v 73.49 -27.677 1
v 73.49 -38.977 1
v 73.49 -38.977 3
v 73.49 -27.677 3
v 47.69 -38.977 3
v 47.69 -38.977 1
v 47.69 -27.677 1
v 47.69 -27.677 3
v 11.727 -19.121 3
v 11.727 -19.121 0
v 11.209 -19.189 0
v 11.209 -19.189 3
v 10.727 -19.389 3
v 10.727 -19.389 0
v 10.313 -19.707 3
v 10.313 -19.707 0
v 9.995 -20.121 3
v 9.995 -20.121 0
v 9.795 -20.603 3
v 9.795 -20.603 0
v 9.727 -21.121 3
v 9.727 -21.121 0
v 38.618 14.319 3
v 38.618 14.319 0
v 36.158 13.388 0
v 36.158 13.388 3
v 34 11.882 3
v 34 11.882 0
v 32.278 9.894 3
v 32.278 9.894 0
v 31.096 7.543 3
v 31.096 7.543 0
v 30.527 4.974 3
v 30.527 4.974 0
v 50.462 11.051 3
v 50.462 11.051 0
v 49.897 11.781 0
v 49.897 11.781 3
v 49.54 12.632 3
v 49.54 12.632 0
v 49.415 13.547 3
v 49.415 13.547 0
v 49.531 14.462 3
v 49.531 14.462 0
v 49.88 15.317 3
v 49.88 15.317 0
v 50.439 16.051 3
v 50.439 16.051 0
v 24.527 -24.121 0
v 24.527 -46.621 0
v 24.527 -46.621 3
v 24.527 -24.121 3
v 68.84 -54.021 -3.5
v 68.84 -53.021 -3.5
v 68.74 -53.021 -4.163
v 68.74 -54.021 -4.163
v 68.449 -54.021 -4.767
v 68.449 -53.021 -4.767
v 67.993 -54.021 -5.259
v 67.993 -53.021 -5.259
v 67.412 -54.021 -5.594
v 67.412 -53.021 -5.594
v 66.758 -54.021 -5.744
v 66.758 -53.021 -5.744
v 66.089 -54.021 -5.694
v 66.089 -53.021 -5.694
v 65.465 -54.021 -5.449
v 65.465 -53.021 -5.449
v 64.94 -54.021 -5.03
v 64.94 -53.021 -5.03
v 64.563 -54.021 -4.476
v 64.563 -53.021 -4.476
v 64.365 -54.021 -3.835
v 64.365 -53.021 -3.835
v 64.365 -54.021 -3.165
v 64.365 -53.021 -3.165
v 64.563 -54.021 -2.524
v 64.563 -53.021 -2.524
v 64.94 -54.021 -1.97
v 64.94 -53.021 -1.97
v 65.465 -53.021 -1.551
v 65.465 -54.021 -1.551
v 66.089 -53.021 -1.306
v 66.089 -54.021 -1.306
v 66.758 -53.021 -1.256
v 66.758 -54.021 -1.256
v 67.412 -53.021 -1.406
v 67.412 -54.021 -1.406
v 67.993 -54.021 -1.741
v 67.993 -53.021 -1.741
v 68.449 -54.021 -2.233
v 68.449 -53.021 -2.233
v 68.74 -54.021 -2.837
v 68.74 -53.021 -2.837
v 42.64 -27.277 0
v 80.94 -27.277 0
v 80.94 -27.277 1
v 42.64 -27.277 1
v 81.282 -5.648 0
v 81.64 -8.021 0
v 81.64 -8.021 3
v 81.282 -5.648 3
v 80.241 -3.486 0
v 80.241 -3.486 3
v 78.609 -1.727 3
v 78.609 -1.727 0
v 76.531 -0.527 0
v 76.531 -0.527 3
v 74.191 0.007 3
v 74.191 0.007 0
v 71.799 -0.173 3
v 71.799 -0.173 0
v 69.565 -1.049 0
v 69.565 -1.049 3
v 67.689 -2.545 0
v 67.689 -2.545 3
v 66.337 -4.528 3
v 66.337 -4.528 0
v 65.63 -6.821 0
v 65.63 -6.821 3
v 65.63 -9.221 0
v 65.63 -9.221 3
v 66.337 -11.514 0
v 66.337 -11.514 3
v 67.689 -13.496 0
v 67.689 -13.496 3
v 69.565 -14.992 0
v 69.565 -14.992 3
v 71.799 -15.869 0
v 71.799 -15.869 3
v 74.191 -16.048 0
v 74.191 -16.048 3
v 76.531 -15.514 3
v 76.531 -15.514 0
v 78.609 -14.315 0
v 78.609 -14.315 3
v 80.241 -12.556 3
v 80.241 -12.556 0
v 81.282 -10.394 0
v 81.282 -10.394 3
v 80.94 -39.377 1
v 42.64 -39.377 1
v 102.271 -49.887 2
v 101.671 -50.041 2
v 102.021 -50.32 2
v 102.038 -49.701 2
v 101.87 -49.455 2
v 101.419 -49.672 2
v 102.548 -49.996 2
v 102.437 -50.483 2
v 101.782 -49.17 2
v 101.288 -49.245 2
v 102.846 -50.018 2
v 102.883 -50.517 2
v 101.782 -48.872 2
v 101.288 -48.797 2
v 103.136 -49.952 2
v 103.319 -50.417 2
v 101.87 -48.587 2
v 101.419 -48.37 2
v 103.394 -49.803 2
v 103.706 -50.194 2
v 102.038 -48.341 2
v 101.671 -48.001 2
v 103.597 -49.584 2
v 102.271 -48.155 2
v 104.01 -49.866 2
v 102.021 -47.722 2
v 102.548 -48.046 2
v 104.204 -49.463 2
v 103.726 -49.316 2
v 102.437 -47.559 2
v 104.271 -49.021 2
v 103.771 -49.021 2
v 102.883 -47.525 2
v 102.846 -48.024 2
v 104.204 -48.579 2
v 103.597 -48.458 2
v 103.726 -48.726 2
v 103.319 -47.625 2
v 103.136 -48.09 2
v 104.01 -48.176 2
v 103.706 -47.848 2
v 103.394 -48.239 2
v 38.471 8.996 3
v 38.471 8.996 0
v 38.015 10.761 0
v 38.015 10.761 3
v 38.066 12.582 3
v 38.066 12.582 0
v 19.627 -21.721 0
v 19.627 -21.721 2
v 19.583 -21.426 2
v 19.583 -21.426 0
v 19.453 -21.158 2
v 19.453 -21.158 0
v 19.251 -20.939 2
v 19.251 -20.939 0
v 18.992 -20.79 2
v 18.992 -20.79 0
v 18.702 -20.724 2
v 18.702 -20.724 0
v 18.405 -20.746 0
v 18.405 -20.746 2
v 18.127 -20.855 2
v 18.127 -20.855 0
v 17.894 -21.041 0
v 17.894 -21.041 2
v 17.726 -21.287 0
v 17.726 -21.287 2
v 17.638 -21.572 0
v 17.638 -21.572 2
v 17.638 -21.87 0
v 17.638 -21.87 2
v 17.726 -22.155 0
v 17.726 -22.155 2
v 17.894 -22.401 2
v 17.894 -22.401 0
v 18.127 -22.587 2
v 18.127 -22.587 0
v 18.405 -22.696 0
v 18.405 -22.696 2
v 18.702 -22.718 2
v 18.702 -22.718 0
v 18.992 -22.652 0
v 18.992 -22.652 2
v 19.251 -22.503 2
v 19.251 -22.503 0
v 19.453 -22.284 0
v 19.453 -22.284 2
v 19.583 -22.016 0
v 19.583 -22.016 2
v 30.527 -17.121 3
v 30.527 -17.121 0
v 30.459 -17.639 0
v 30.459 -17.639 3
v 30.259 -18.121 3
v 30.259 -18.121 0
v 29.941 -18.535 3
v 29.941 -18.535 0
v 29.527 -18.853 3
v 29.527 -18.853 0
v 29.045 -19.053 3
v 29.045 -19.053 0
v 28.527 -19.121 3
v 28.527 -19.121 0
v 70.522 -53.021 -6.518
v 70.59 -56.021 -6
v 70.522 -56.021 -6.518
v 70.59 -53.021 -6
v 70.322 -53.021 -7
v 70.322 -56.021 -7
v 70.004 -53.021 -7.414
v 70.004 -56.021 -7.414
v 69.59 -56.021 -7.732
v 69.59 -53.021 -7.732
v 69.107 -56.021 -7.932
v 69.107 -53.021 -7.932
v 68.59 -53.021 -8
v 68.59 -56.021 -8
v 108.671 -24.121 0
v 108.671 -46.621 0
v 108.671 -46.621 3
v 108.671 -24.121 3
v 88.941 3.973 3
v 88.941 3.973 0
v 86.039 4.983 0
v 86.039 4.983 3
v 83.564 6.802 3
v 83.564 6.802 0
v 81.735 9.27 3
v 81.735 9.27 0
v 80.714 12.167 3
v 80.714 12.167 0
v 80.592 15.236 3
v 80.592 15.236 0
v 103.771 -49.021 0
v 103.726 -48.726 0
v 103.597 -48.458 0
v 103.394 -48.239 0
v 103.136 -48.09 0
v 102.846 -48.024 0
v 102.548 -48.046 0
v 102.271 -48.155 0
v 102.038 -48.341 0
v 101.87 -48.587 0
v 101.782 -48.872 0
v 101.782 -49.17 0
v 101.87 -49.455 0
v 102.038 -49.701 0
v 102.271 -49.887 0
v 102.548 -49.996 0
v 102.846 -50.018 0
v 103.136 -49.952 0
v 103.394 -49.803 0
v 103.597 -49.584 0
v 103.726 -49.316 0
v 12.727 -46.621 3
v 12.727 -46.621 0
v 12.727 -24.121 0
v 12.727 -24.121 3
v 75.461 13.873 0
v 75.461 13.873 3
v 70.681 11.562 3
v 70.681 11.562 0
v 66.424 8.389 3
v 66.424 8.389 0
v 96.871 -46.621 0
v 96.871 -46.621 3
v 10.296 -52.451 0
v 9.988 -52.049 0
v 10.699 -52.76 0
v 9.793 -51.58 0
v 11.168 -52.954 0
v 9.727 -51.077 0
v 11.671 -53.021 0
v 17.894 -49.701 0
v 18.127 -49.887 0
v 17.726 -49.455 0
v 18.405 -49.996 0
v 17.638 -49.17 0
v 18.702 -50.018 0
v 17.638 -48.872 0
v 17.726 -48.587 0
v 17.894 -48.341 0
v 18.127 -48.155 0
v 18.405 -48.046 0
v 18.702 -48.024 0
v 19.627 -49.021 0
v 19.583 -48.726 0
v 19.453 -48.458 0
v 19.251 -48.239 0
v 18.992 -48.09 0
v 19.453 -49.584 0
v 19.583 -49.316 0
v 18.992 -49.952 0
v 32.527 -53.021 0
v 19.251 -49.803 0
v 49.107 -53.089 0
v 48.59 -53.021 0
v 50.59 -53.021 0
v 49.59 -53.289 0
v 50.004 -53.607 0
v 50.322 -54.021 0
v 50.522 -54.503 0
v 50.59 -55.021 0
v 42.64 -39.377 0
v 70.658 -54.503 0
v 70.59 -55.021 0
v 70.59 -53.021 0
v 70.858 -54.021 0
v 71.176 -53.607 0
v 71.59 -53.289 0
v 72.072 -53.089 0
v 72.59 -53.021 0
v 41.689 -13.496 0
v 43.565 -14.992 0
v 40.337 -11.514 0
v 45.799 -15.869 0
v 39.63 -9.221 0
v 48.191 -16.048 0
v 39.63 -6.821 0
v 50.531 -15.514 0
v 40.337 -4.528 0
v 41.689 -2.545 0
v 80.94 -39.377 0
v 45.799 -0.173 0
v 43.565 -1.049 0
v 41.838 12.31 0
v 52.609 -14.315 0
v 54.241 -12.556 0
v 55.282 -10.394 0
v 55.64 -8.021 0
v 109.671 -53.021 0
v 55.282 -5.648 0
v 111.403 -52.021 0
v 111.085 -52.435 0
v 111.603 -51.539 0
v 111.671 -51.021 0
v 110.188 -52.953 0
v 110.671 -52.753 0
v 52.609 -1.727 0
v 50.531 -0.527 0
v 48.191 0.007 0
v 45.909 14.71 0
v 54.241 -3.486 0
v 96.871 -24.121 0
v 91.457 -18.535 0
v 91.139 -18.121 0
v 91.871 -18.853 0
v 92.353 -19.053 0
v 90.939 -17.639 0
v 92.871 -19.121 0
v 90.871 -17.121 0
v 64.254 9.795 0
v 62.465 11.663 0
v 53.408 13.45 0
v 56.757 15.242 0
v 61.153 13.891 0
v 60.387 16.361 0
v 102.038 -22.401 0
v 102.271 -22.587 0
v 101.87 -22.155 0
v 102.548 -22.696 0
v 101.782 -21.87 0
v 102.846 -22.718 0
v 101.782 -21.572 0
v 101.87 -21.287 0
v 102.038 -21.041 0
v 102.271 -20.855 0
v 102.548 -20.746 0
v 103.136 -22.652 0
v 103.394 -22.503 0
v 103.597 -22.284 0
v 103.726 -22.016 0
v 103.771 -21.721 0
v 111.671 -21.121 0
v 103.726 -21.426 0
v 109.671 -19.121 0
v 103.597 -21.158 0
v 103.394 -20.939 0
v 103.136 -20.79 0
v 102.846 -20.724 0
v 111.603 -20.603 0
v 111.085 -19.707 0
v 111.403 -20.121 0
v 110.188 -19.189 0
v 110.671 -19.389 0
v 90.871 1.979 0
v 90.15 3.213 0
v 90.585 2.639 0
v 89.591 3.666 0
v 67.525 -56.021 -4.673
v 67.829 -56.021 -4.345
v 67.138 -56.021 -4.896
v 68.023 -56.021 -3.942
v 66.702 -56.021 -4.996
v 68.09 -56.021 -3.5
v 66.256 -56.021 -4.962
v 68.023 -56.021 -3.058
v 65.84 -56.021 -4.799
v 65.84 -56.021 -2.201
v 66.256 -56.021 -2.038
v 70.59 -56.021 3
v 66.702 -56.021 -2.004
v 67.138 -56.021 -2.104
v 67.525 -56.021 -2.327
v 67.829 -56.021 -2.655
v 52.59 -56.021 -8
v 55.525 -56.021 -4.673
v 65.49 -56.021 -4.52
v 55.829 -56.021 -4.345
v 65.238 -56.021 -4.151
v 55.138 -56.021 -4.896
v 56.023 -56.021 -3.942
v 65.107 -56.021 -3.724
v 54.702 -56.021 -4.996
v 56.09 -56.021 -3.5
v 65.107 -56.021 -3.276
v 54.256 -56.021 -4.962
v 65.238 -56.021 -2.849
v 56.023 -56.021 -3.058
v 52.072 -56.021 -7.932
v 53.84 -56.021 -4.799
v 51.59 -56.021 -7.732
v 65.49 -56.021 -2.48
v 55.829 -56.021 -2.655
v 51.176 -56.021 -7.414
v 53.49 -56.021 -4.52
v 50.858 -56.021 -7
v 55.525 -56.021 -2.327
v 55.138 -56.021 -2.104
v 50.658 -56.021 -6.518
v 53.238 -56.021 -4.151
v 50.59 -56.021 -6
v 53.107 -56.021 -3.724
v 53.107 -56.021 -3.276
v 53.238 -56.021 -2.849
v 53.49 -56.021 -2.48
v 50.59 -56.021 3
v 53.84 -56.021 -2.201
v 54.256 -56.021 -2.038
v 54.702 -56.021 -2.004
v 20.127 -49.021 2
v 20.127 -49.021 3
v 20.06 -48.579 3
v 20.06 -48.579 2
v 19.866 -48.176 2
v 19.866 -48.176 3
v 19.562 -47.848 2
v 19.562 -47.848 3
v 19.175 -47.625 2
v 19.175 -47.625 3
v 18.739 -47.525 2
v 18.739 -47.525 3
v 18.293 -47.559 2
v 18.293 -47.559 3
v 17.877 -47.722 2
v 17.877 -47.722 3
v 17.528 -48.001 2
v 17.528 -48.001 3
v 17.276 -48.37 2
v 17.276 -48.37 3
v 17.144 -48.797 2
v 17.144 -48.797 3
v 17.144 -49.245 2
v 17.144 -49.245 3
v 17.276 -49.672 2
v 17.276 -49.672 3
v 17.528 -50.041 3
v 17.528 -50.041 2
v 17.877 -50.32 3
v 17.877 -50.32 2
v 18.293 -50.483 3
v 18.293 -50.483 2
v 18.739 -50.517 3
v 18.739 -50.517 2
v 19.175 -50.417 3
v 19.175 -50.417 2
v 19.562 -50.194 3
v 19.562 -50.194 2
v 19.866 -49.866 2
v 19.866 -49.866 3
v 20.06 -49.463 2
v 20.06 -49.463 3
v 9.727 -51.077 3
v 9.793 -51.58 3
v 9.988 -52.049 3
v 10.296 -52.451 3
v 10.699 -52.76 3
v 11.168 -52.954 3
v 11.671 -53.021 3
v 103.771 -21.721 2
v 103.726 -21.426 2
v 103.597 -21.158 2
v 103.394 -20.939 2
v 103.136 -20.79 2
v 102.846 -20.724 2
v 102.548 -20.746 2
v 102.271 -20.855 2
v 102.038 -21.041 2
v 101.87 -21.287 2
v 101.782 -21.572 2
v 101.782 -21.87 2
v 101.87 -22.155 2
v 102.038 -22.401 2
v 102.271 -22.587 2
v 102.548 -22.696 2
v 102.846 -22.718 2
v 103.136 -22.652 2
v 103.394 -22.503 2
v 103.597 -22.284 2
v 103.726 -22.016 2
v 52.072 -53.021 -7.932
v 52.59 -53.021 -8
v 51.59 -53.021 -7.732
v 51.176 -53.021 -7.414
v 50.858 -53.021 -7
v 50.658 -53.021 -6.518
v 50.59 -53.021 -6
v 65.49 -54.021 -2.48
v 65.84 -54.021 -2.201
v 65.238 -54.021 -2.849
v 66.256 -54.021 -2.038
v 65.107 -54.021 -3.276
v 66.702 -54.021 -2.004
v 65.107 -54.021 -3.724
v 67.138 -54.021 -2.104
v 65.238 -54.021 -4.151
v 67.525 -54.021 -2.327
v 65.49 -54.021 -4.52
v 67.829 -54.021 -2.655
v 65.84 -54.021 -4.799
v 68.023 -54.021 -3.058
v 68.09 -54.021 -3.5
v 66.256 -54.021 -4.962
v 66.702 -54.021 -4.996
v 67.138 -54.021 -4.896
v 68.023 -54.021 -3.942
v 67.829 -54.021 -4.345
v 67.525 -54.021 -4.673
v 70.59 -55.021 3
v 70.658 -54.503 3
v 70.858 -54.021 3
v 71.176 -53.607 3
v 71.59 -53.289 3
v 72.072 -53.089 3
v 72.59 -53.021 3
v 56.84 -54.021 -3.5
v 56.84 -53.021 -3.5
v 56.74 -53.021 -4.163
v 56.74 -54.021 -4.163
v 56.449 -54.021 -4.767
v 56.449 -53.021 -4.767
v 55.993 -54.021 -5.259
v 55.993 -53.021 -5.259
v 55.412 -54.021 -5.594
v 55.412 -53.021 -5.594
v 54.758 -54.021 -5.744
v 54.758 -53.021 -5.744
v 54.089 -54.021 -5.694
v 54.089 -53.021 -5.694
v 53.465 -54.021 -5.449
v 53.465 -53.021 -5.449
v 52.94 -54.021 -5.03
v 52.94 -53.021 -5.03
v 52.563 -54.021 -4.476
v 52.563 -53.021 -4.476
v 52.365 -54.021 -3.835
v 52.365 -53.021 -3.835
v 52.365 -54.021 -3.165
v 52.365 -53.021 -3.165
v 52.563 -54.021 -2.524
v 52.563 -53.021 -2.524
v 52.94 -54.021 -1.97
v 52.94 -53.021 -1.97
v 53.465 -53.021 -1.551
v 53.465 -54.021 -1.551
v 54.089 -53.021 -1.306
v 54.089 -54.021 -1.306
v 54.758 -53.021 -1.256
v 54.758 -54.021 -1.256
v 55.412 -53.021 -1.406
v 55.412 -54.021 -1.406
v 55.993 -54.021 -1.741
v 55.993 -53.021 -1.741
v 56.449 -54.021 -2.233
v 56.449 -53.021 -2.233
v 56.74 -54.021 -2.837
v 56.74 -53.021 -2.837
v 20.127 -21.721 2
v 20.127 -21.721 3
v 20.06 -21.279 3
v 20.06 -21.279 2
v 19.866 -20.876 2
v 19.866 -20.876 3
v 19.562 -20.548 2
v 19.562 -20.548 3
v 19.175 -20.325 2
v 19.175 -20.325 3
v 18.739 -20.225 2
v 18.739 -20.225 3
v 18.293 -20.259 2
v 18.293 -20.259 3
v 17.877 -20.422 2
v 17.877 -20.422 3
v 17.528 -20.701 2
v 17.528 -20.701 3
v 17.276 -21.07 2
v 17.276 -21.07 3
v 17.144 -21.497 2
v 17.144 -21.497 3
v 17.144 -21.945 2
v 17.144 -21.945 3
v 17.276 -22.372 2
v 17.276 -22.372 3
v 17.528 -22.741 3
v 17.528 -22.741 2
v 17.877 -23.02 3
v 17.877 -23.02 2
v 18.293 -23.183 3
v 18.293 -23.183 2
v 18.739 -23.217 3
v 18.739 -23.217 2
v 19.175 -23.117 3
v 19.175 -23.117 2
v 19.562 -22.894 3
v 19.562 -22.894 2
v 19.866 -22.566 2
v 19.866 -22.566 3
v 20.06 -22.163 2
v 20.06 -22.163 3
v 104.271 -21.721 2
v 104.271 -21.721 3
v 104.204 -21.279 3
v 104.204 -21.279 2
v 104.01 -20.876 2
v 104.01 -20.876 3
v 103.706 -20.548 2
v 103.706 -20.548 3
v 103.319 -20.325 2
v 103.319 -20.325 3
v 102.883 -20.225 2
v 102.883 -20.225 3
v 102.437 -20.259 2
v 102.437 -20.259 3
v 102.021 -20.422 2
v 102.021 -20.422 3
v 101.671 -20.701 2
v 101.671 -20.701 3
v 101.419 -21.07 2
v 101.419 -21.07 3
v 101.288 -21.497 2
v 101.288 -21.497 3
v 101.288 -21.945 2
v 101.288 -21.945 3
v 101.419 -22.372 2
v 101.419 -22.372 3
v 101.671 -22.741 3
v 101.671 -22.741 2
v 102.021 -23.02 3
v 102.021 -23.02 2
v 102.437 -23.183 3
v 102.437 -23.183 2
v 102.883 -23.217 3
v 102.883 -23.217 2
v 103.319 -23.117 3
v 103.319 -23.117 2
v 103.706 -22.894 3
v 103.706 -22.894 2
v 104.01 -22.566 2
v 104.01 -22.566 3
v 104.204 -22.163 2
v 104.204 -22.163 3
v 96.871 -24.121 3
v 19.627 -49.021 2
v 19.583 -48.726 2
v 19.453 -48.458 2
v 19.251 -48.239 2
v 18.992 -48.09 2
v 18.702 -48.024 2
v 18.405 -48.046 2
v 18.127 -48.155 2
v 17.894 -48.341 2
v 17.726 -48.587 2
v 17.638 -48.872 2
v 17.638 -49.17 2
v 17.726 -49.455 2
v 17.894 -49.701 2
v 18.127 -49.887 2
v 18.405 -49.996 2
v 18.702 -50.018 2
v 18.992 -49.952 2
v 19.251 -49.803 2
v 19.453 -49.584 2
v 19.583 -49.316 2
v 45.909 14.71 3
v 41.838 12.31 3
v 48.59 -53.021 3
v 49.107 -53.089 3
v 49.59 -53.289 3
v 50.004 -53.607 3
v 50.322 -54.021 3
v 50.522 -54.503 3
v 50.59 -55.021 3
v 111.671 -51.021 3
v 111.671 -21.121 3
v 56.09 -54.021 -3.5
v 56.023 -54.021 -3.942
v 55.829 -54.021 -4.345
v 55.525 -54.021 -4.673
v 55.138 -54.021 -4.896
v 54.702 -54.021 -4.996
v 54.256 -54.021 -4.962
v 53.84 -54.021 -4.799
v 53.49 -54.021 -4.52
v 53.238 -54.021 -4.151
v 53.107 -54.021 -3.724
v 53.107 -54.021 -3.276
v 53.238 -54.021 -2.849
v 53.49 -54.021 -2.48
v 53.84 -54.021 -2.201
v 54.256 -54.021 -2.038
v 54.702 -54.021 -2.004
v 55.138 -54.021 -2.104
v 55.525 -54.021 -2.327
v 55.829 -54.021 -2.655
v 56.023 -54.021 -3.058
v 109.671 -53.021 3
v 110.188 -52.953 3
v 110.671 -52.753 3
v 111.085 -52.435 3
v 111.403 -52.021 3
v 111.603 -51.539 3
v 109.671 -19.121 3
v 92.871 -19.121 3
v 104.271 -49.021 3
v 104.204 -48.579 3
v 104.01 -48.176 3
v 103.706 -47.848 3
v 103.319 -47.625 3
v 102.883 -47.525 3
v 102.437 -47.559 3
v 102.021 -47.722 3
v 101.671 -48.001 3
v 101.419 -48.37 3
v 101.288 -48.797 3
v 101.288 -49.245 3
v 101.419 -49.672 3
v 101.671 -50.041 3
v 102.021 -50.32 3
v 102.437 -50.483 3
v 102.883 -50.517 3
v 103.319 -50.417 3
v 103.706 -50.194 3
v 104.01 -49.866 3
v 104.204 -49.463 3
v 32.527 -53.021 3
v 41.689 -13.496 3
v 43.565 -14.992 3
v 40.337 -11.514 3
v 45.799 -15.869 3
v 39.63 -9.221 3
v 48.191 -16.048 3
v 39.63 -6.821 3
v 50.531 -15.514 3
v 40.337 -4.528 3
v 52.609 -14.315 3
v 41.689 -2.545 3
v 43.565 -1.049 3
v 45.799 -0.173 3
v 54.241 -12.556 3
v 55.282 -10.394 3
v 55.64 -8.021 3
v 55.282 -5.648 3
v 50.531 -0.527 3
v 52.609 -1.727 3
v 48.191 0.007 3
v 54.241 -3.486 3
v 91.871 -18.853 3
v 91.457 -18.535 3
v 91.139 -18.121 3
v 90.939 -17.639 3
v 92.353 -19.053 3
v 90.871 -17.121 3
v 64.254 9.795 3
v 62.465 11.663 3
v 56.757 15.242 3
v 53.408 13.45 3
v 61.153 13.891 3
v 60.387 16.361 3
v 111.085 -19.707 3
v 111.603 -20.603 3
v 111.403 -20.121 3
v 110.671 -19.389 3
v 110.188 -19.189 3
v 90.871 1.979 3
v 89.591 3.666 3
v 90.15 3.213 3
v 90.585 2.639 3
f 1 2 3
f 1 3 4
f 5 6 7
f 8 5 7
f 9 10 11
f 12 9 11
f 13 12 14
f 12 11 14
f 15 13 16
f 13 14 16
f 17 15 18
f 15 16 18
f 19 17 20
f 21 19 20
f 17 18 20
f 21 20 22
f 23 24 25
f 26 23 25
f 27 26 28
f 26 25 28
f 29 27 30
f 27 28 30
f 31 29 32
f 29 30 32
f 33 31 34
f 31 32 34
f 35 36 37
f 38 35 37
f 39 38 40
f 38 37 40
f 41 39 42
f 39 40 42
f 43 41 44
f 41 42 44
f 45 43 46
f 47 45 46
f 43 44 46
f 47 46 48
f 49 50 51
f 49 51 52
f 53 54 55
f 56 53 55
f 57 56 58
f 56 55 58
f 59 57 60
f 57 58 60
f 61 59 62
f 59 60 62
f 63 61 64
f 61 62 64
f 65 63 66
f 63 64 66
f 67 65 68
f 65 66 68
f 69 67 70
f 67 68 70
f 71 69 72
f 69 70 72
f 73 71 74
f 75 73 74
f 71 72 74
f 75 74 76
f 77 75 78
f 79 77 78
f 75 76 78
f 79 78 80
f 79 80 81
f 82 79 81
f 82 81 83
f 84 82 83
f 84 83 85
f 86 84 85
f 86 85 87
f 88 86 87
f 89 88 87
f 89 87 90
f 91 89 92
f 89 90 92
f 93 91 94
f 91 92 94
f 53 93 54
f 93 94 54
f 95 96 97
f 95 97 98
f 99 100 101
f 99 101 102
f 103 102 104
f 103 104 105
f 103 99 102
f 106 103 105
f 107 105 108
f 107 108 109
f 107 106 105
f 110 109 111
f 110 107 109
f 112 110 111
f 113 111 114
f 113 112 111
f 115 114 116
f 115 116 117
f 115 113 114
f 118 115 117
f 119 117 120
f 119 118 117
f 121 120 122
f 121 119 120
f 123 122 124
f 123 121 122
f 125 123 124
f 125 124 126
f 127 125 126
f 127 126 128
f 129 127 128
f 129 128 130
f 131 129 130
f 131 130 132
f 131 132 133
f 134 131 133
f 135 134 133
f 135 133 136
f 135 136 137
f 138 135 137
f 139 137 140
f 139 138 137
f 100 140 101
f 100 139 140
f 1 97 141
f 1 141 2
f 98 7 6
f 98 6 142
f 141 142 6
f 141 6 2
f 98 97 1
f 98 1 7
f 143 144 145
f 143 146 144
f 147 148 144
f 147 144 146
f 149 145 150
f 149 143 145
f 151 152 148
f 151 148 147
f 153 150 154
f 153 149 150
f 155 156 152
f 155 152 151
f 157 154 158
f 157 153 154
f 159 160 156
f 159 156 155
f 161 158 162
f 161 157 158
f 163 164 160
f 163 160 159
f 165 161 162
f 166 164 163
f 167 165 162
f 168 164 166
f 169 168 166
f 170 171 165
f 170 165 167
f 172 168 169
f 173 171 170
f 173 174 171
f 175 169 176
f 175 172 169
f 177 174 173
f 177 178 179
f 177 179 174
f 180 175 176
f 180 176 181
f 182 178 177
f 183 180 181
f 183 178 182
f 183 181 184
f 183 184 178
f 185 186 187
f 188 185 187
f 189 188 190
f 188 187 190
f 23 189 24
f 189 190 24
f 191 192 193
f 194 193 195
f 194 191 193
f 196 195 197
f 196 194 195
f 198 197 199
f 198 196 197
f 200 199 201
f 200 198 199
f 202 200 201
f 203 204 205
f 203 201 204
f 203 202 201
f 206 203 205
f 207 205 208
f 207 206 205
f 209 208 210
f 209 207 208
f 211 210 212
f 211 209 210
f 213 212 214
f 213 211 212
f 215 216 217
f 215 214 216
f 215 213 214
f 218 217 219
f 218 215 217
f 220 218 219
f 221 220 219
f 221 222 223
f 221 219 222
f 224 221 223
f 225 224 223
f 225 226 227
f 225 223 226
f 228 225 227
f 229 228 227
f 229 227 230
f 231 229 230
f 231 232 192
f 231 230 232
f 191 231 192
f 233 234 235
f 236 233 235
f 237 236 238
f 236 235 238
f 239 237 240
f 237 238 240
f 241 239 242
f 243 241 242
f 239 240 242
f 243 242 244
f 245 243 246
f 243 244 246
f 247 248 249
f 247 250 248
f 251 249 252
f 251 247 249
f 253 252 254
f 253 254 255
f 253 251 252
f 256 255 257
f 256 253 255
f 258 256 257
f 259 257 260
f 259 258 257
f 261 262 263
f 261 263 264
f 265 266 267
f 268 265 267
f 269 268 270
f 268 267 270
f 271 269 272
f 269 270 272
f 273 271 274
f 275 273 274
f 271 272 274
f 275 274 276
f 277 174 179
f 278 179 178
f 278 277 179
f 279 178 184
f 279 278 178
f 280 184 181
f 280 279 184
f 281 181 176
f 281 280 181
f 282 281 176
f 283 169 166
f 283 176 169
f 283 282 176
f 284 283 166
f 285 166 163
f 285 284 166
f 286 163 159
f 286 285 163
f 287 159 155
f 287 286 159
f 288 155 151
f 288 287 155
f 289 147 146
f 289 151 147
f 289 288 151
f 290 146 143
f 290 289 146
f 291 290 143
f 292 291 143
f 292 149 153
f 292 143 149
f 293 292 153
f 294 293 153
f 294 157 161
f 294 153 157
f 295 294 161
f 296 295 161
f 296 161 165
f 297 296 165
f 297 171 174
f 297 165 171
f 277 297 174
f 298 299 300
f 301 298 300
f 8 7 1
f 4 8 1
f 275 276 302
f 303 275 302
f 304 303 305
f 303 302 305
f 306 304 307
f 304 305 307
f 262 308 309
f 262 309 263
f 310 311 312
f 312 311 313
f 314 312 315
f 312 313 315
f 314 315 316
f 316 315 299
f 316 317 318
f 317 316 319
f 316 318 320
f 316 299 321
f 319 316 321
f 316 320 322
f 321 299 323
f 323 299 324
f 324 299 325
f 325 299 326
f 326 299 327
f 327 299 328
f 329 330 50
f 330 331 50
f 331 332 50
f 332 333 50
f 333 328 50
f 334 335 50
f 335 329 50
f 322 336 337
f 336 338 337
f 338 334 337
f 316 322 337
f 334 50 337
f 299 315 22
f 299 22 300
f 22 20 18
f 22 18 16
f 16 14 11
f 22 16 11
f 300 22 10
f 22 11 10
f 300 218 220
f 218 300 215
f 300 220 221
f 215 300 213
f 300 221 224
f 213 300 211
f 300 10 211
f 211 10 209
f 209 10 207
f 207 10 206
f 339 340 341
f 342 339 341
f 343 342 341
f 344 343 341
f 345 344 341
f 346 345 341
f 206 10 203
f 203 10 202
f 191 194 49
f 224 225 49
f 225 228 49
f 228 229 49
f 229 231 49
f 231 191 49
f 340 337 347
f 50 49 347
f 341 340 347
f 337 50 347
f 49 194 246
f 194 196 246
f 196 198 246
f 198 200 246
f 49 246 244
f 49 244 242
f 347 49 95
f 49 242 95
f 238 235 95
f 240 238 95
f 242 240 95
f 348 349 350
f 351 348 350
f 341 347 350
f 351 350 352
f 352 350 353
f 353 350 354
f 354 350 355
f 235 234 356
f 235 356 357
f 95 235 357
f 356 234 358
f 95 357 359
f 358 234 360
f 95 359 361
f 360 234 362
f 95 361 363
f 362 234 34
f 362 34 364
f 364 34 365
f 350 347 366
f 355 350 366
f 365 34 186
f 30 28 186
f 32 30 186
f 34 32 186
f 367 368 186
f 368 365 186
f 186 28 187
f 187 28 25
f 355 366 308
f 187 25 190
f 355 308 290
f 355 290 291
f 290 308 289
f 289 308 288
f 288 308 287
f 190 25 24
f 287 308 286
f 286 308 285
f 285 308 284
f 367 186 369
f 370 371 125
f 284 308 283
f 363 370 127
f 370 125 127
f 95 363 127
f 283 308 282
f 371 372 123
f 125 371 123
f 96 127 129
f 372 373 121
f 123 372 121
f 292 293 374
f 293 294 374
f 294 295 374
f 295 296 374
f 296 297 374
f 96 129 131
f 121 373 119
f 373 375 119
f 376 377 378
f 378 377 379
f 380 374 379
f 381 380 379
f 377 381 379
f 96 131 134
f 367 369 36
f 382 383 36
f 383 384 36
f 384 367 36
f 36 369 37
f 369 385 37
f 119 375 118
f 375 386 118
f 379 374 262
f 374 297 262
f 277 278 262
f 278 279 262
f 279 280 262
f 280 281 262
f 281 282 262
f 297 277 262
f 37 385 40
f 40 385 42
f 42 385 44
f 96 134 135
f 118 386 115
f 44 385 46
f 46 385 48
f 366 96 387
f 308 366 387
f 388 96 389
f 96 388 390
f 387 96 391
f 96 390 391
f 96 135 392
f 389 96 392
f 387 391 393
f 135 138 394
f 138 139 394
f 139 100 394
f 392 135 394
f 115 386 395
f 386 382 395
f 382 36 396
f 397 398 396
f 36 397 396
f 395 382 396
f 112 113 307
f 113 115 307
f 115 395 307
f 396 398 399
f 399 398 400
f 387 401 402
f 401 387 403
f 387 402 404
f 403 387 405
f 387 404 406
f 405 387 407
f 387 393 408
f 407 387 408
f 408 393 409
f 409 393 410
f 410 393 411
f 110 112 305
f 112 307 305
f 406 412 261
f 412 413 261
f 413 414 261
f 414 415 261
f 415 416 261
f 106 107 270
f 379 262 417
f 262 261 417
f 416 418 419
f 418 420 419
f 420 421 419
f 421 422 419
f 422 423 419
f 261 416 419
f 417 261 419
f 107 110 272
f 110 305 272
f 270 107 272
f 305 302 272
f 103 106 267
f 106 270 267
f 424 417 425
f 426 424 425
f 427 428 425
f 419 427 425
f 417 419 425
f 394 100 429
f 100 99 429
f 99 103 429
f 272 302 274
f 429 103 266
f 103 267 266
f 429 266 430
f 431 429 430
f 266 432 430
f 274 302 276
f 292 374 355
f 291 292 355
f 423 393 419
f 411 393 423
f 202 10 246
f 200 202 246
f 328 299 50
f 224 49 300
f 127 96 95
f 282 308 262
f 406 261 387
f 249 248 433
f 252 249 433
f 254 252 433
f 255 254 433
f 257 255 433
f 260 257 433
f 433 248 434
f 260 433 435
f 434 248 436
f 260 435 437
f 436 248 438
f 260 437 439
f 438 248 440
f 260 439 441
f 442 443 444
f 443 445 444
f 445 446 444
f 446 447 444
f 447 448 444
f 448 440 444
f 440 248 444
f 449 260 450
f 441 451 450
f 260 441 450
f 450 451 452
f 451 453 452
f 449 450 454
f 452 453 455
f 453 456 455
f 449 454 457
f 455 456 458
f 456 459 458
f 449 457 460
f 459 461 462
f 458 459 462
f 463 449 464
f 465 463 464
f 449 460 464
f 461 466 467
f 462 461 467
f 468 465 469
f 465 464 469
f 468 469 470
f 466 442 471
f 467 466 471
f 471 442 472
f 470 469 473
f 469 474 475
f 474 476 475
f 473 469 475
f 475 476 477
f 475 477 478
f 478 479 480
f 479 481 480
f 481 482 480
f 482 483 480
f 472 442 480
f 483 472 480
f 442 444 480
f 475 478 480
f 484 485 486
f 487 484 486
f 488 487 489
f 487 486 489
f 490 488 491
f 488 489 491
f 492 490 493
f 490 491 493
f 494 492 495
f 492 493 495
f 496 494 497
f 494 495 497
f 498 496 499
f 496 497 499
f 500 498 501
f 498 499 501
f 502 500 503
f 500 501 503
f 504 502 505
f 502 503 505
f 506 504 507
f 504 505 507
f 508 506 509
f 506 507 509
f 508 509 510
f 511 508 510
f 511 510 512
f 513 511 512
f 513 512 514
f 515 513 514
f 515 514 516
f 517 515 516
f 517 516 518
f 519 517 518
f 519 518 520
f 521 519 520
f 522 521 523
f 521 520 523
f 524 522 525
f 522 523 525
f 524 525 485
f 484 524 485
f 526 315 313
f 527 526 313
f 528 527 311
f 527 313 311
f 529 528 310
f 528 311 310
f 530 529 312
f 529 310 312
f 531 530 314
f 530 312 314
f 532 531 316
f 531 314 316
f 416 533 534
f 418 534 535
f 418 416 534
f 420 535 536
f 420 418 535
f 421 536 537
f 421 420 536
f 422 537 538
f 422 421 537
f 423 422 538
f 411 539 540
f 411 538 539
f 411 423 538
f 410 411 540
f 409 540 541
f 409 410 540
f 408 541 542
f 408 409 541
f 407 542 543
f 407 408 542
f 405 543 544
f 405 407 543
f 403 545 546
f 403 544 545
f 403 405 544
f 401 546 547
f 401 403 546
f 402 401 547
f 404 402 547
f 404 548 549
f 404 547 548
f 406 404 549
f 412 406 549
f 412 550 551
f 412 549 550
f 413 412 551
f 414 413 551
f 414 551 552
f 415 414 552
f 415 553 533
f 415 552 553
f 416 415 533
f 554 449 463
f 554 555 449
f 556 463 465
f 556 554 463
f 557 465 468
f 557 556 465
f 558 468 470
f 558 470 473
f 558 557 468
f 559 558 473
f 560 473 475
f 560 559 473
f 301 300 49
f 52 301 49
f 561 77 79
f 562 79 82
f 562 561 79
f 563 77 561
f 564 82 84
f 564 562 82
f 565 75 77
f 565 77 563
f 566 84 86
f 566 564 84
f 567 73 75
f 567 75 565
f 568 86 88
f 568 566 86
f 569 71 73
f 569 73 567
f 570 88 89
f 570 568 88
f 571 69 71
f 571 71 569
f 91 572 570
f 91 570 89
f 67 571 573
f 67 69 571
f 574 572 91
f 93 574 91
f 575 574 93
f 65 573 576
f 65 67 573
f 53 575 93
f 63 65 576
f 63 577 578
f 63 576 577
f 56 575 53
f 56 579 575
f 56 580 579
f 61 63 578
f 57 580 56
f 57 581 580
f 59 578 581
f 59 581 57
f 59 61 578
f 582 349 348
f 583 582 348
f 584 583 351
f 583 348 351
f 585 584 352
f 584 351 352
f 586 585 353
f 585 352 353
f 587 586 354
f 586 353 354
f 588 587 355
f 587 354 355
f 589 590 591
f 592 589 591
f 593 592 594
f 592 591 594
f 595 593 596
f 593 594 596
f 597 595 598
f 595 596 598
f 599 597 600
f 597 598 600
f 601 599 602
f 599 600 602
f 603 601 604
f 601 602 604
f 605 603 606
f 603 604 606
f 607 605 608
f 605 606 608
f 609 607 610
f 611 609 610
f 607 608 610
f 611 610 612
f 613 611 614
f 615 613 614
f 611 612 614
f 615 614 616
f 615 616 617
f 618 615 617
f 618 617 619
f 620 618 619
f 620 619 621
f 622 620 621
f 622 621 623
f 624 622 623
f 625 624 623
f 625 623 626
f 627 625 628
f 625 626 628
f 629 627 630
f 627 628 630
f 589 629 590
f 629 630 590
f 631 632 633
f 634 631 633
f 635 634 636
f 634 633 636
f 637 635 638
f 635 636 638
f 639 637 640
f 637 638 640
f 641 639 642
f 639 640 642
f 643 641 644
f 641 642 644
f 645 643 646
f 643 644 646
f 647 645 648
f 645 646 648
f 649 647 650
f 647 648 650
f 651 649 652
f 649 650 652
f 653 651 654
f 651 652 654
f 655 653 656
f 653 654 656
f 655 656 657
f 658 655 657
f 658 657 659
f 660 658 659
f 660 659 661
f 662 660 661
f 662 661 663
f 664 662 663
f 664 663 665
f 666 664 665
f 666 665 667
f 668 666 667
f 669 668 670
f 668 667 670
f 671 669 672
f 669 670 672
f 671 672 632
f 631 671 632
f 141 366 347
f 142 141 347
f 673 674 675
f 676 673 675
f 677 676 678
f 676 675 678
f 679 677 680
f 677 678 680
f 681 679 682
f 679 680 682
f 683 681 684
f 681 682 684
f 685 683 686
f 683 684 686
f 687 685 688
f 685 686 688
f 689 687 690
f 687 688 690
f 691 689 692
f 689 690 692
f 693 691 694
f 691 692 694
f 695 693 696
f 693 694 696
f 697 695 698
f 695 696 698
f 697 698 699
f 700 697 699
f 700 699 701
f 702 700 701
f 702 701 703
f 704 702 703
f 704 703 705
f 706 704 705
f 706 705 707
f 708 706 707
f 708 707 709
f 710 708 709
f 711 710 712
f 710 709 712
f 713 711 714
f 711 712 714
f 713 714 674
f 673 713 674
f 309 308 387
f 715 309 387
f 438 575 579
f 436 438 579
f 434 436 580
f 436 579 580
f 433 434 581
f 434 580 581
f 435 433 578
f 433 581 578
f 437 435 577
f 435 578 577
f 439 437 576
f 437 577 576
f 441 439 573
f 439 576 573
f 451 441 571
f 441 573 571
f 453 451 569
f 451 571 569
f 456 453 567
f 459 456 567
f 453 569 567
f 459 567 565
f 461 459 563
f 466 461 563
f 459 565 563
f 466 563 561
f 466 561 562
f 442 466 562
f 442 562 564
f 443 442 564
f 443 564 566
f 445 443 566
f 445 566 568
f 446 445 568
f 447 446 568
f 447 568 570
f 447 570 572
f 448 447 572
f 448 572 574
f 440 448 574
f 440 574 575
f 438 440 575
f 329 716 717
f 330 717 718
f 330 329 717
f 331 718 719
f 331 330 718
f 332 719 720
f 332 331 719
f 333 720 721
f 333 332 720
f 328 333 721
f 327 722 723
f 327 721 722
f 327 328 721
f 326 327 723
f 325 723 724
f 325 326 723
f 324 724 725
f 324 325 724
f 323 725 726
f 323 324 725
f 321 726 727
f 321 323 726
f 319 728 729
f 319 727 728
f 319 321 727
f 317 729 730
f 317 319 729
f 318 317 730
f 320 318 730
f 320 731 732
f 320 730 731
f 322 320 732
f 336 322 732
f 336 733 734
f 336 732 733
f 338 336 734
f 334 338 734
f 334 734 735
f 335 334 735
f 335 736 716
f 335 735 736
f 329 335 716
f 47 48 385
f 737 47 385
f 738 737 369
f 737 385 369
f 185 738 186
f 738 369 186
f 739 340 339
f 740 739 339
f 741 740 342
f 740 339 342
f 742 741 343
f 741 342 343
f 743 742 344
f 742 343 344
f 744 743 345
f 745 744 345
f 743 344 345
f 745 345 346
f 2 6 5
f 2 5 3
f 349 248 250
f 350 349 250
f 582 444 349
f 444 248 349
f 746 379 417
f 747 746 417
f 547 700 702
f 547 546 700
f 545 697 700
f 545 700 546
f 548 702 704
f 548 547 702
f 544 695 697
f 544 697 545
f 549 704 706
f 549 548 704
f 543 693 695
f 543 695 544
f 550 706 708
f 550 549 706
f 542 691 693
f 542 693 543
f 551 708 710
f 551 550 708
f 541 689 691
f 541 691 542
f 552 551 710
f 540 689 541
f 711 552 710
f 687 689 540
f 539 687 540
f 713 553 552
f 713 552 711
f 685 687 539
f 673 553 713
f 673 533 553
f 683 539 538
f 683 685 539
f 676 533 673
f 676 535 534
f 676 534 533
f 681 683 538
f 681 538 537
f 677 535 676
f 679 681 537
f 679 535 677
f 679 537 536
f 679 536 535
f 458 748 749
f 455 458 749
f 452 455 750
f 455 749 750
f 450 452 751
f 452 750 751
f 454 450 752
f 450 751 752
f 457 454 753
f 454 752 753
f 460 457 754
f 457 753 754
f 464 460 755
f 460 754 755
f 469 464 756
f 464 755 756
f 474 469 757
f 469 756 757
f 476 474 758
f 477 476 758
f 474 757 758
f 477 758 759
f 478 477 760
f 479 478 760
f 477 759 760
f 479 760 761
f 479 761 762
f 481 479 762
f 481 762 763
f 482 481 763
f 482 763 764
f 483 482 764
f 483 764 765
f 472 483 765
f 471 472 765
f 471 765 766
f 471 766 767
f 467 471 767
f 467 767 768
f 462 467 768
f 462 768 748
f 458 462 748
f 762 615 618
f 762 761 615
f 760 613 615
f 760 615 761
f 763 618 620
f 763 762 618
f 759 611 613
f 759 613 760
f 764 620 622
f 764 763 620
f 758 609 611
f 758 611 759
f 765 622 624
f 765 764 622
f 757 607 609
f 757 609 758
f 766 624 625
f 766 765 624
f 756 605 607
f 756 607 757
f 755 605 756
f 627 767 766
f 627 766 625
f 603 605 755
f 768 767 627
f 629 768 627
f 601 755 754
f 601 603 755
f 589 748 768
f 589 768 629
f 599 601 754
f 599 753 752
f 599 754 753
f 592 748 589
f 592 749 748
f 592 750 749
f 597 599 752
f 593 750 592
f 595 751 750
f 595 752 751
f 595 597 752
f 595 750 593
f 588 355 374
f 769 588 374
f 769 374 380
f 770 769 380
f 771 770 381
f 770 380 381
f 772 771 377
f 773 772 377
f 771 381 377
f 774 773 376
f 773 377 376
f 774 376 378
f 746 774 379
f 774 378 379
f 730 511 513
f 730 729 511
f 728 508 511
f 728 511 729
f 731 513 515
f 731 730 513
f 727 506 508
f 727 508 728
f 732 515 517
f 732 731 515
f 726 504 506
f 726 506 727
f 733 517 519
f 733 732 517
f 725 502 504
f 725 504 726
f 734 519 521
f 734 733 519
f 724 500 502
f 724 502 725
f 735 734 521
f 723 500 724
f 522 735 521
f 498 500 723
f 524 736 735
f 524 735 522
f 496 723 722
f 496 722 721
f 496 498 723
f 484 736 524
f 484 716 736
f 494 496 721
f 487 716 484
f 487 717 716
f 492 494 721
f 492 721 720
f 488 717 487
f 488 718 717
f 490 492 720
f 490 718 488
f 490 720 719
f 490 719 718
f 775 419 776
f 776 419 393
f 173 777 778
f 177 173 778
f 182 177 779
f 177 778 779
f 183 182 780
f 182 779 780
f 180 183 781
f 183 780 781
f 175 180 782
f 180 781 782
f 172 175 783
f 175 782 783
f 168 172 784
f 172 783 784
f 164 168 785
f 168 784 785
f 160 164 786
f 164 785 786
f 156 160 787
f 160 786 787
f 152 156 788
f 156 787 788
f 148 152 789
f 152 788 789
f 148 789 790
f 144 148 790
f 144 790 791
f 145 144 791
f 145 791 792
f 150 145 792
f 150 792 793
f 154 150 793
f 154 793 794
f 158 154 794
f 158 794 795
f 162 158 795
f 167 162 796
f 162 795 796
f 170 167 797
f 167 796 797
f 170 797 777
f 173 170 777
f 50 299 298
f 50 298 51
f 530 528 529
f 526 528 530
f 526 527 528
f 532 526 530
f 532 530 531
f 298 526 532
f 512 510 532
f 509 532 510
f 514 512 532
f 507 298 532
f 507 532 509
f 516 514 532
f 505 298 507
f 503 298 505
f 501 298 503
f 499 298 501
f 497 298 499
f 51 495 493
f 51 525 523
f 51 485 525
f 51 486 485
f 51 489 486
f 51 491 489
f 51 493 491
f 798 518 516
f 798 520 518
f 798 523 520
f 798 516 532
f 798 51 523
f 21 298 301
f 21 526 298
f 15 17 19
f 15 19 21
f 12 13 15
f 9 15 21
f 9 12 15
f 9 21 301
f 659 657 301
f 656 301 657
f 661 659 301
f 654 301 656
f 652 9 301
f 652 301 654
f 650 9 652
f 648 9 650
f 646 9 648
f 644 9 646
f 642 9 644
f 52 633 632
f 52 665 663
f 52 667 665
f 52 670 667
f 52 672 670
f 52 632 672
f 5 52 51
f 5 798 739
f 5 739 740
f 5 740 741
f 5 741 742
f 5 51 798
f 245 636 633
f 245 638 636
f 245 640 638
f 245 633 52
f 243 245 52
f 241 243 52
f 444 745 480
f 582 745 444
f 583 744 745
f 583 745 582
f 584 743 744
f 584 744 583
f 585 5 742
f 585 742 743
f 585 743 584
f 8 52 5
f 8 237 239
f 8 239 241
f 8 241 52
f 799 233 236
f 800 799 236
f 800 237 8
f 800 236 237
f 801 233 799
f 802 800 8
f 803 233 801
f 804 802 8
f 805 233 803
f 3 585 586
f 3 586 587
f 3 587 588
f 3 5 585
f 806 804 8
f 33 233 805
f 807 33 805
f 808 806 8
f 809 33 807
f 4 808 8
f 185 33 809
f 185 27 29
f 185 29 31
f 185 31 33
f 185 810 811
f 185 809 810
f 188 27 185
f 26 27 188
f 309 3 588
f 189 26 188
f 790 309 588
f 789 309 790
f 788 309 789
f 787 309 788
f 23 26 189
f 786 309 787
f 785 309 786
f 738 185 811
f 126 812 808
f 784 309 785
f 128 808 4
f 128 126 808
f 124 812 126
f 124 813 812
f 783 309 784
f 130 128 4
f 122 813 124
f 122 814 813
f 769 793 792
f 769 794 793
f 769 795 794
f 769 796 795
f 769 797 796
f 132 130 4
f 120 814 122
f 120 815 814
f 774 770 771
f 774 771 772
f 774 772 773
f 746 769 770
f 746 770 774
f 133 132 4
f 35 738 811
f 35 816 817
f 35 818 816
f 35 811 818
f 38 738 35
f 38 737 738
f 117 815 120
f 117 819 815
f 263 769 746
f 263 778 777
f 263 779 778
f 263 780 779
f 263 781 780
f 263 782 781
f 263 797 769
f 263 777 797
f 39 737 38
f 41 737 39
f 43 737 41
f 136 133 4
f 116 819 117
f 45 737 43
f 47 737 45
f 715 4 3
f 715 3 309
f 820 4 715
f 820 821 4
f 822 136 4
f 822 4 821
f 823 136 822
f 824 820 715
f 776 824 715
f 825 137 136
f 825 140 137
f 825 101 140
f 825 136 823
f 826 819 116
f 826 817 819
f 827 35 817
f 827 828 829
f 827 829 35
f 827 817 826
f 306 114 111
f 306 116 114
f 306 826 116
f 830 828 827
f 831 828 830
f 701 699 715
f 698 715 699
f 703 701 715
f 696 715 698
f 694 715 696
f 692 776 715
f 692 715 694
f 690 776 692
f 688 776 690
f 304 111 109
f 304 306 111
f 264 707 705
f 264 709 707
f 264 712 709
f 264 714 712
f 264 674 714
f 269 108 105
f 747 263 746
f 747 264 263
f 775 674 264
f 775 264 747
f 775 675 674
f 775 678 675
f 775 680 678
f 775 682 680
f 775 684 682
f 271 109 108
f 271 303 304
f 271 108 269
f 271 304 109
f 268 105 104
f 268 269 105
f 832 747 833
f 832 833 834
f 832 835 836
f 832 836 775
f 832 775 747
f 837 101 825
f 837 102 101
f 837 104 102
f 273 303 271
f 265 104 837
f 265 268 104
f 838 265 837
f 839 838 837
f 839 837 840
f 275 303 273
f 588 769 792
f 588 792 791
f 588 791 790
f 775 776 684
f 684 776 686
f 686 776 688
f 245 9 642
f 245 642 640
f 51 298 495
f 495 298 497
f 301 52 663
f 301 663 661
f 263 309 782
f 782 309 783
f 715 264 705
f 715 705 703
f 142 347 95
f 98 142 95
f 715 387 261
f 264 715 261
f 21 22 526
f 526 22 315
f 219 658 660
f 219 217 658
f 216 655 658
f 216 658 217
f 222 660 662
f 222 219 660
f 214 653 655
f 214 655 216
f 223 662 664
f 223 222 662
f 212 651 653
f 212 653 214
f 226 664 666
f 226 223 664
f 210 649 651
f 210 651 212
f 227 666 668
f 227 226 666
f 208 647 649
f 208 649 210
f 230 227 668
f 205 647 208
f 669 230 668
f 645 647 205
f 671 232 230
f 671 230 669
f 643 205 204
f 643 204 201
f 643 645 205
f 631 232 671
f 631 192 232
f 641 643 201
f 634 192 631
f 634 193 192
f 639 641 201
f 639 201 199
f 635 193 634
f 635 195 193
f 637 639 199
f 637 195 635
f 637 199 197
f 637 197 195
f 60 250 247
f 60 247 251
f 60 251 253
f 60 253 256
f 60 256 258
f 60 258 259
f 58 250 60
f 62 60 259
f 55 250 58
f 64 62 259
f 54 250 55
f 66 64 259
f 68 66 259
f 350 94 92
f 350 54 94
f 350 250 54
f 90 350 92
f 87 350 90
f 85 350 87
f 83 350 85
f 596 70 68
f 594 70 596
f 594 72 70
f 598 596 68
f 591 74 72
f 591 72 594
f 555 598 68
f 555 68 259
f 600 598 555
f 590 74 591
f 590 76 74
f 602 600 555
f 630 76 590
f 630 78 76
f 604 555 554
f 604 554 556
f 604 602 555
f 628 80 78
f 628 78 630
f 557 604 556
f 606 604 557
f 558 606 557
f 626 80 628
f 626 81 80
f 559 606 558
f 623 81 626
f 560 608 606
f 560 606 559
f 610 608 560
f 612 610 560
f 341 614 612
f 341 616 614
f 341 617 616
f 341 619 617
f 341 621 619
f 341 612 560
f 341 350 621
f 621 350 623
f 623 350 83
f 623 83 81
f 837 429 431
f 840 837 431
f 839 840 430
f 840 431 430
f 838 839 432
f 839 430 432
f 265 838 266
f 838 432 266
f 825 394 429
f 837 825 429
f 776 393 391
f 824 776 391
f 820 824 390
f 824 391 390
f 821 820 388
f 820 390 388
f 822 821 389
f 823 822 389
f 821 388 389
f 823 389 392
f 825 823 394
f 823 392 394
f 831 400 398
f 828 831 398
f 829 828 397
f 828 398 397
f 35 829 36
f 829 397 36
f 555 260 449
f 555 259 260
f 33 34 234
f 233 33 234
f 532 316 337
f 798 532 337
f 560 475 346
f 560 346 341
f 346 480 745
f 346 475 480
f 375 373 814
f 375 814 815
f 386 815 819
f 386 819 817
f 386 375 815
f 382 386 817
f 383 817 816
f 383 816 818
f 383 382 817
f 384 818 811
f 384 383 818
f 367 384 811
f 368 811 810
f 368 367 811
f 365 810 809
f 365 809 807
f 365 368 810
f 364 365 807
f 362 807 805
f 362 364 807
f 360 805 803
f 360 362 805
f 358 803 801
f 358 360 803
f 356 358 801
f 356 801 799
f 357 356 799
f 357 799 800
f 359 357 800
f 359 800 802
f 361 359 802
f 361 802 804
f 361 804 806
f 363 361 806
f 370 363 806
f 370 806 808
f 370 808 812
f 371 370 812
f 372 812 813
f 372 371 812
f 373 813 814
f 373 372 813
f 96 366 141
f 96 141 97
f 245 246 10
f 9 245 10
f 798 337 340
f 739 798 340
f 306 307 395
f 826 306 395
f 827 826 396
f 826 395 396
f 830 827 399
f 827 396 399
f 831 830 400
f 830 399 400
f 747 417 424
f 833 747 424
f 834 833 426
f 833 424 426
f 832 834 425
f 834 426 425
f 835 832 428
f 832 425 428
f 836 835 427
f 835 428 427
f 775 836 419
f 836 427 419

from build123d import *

# Parameters (mm, degrees)
MODEL_R                 = 8.05
MODEL_R_2               = 1
MODEL_W                 = 25.8
MODEL_H                 = 11.3
MODEL_W_2               = 11.8
MODEL_H_2               = 22.5
SALIENTE_EXTRUIR1_DEPTH = 3
CROQUIS2_W              = 38.3
CROQUIS2_H              = 12.1
CORTAR_EXTRUIR1_DEPTH   = 1
CROQUIS3_R              = 1.5
CORTAR_EXTRUIR2_DEPTH   = 1
CROQUIS4_W              = 20
CROQUIS4_H              = 3
SALIENTE_EXTRUIR2_DEPTH = 8
CROQUIS5_R              = 1.5
CORTAR_EXTRUIR3_DEPTH   = 3
CROQUIS6_R              = 2.25
CORTAR_EXTRUIR4_DEPTH   = 1
REDONDEO1_R             = 2


with BuildPart() as part:
    # Model → Saliente-Extruir1 (new body)
    with BuildSketch(Plane.XY):
        with BuildLine():
            Line((50.589823504, -56.021207572), (70.589823504, -56.021207572))
            Line((70.589823504, -56.021207572), (70.589823504, -55.020997464))
            ThreePointArc((70.589823504, -55.020997464), (71.175609941, -53.606783901), (72.589823504, -53.020997464))
            Line((72.589823504, -53.020997464), (88.870799912, -53.020997464))
            Line((88.870799912, -53.020997464), (109.670799912, -53.020997464))
            ThreePointArc((109.670799912, -53.020997464), (111.085013474, -52.435211026), (111.670799912, -51.020997464))
            Line((111.670799912, -51.020997464), (111.670799912, -21.120997464))
            ThreePointArc((111.670799912, -21.120997464), (111.085013474, -19.706783901), (109.670799912, -19.120997464))
            Line((109.670799912, -19.120997464), (92.870799912, -19.120997464))
            ThreePointArc((92.870799912, -19.120997464), (91.456586349, -18.535211026), (90.870799912, -17.120997464))
            Line((90.870799912, -17.120997464), (90.870799912, 1.979002536))
            ThreePointArc((90.870799912, 1.979002536), (90.150187884, 3.212884764), (88.940527152, 3.973455574))
            ThreePointArc((88.940527152, 3.973455574), (82.556801864, 7.967186508), (80.592387516, 15.236499516))
            ThreePointArc((80.592387516, 15.236499516), (73.016137183, 12.831206377), (66.424253692, 8.389126209))
            ThreePointArc((66.424253692, 8.389126209), (62.464845981, 11.66270114), (60.387431279, 16.361376528))
            ThreePointArc((60.387431279, 16.361376528), (55.039384462, 14.426569266), (50.461877073, 11.051438157))
            ThreePointArc((50.461877073, 11.051438157), (49.41482724, 13.546636971), (50.438823204, 16.051385009))
            ThreePointArc((50.438823204, 16.051385009), (43.800023098, 13.634815248), (38.471226177, 8.99613013))
            ThreePointArc((38.471226177, 8.99613013), (37.976525569, 11.673196605), (38.618250464, 14.318872844))
            ThreePointArc((38.618250464, 14.318872844), (33.077419178, 10.94136051), (30.527119253, 4.974420659))
            Line((30.527119253, 4.974420659), (30.527119253, -17.120997464))
            ThreePointArc((30.527119253, -17.120997464), (29.941332816, -18.535211026), (28.527119253, -19.120997464))
            Line((28.527119253, -19.120997464), (11.727119253, -19.120997464))
            ThreePointArc((11.727119253, -19.120997464), (10.312905691, -19.706783901), (9.727119253, -21.120997464))
            Line((9.727119253, -21.120997464), (9.727119253, -51.076893199))
            ThreePointArc((9.727119253, -51.076893199), (10.296410138, -52.451282972), (11.670799912, -53.020573857))
            Line((11.670799912, -53.020573857), (32.527119253, -53.020997464))
            Line((32.527119253, -53.020997464), (48.589823504, -53.020997464))
            ThreePointArc((48.589823504, -53.020997464), (50.004037066, -53.606783901), (50.589823504, -55.020997464))
            Line((50.589823504, -55.020997464), (50.589823504, -56.021207572))
        make_face()
        with Locations((47.589823504, -8.020840193)):
            Circle(MODEL_R, mode=Mode.SUBTRACT)
        with Locations((73.589823504, -8.020840193)):
            Circle(MODEL_R, mode=Mode.SUBTRACT)
        with Locations((102.770799912, -21.720997464)):
            Circle(MODEL_R_2, mode=Mode.SUBTRACT)
        with Locations((102.770799912, -49.020997464)):
            Circle(MODEL_R_2, mode=Mode.SUBTRACT)
        with Locations((18.627119253, -21.720997464)):
            Circle(MODEL_R_2, mode=Mode.SUBTRACT)
        with Locations((18.627119253, -49.020997464)):
            Circle(MODEL_R_2, mode=Mode.SUBTRACT)
        with Locations((60.589823504, -33.326919867)):
            Rectangle(MODEL_W, MODEL_H, mode=Mode.SUBTRACT)
        with Locations((102.770799912, -35.370997464)):
            Rectangle(MODEL_W_2, MODEL_H_2, mode=Mode.SUBTRACT)
        with Locations((18.627119253, -35.370997464)):
            Rectangle(MODEL_W_2, MODEL_H_2, mode=Mode.SUBTRACT)
    extrude(amount=SALIENTE_EXTRUIR1_DEPTH)

    # Croquis2 → Cortar-Extruir1 (cut)
    with BuildSketch(Plane(origin=(0, 0, 0), x_dir=(-1, 0, 0), z_dir=(0, 0, -1))):
        with Locations((-61.789823504, -33.326919867)):
            Rectangle(CROQUIS2_W, CROQUIS2_H)
    extrude(amount=-CORTAR_EXTRUIR1_DEPTH, mode=Mode.SUBTRACT)

    # Croquis3 → Cortar-Extruir2 (cut)
    with BuildSketch(Plane.XY.offset(3)):
        with Locations((18.627119253, -21.720997464)):
            Circle(CROQUIS3_R)
        with Locations((18.627119253, -49.020997464)):
            Circle(CROQUIS3_R)
        with Locations((102.770799912, -49.020997464)):
            Circle(CROQUIS3_R)
        with Locations((102.770799912, -21.720997464)):
            Circle(CROQUIS3_R)
    extrude(amount=-CORTAR_EXTRUIR2_DEPTH, mode=Mode.SUBTRACT)

    # Croquis4 → Saliente-Extruir2 (add)
    with BuildSketch(Plane(origin=(0, 0, 0), x_dir=(-1, 0, 0), z_dir=(0, 0, -1))):
        with Locations((-60.589823504, -54.521207572)):
            Rectangle(CROQUIS4_W, CROQUIS4_H)
    extrude(amount=SALIENTE_EXTRUIR2_DEPTH)

    # Croquis5 → Cortar-Extruir3 (cut)
    with BuildSketch(Plane(origin=(0, -53.021207572, 0), x_dir=(1, 0, 0), z_dir=(0, 1, 0))):
        with Locations((54.589823504, 3.5)):
            Circle(CROQUIS5_R)
        with Locations((66.589823504, 3.5)):
            Circle(CROQUIS5_R)
    extrude(amount=-CORTAR_EXTRUIR3_DEPTH, mode=Mode.SUBTRACT)

    # Croquis6 → Cortar-Extruir4 (cut)
    with BuildSketch(Plane(origin=(0, -53.021207572, 0), x_dir=(1, 0, 0), z_dir=(0, 1, 0))):
        with Locations((66.589823504, 3.5)):
            Circle(CROQUIS6_R)
        with Locations((54.589823504, 3.5)):
            Circle(CROQUIS6_R)
    extrude(amount=-CORTAR_EXTRUIR4_DEPTH, mode=Mode.SUBTRACT)

    # Redondeo1
    redondeo1_edges = [part.edges().sort_by_distance(p)[0] for p in [
        (70.589823504, -54.521207572, -8),
        (50.589823504, -54.521207572, -8),
    ]]
    fillet(redondeo1_edges, radius=REDONDEO1_R)


solid = part.part
